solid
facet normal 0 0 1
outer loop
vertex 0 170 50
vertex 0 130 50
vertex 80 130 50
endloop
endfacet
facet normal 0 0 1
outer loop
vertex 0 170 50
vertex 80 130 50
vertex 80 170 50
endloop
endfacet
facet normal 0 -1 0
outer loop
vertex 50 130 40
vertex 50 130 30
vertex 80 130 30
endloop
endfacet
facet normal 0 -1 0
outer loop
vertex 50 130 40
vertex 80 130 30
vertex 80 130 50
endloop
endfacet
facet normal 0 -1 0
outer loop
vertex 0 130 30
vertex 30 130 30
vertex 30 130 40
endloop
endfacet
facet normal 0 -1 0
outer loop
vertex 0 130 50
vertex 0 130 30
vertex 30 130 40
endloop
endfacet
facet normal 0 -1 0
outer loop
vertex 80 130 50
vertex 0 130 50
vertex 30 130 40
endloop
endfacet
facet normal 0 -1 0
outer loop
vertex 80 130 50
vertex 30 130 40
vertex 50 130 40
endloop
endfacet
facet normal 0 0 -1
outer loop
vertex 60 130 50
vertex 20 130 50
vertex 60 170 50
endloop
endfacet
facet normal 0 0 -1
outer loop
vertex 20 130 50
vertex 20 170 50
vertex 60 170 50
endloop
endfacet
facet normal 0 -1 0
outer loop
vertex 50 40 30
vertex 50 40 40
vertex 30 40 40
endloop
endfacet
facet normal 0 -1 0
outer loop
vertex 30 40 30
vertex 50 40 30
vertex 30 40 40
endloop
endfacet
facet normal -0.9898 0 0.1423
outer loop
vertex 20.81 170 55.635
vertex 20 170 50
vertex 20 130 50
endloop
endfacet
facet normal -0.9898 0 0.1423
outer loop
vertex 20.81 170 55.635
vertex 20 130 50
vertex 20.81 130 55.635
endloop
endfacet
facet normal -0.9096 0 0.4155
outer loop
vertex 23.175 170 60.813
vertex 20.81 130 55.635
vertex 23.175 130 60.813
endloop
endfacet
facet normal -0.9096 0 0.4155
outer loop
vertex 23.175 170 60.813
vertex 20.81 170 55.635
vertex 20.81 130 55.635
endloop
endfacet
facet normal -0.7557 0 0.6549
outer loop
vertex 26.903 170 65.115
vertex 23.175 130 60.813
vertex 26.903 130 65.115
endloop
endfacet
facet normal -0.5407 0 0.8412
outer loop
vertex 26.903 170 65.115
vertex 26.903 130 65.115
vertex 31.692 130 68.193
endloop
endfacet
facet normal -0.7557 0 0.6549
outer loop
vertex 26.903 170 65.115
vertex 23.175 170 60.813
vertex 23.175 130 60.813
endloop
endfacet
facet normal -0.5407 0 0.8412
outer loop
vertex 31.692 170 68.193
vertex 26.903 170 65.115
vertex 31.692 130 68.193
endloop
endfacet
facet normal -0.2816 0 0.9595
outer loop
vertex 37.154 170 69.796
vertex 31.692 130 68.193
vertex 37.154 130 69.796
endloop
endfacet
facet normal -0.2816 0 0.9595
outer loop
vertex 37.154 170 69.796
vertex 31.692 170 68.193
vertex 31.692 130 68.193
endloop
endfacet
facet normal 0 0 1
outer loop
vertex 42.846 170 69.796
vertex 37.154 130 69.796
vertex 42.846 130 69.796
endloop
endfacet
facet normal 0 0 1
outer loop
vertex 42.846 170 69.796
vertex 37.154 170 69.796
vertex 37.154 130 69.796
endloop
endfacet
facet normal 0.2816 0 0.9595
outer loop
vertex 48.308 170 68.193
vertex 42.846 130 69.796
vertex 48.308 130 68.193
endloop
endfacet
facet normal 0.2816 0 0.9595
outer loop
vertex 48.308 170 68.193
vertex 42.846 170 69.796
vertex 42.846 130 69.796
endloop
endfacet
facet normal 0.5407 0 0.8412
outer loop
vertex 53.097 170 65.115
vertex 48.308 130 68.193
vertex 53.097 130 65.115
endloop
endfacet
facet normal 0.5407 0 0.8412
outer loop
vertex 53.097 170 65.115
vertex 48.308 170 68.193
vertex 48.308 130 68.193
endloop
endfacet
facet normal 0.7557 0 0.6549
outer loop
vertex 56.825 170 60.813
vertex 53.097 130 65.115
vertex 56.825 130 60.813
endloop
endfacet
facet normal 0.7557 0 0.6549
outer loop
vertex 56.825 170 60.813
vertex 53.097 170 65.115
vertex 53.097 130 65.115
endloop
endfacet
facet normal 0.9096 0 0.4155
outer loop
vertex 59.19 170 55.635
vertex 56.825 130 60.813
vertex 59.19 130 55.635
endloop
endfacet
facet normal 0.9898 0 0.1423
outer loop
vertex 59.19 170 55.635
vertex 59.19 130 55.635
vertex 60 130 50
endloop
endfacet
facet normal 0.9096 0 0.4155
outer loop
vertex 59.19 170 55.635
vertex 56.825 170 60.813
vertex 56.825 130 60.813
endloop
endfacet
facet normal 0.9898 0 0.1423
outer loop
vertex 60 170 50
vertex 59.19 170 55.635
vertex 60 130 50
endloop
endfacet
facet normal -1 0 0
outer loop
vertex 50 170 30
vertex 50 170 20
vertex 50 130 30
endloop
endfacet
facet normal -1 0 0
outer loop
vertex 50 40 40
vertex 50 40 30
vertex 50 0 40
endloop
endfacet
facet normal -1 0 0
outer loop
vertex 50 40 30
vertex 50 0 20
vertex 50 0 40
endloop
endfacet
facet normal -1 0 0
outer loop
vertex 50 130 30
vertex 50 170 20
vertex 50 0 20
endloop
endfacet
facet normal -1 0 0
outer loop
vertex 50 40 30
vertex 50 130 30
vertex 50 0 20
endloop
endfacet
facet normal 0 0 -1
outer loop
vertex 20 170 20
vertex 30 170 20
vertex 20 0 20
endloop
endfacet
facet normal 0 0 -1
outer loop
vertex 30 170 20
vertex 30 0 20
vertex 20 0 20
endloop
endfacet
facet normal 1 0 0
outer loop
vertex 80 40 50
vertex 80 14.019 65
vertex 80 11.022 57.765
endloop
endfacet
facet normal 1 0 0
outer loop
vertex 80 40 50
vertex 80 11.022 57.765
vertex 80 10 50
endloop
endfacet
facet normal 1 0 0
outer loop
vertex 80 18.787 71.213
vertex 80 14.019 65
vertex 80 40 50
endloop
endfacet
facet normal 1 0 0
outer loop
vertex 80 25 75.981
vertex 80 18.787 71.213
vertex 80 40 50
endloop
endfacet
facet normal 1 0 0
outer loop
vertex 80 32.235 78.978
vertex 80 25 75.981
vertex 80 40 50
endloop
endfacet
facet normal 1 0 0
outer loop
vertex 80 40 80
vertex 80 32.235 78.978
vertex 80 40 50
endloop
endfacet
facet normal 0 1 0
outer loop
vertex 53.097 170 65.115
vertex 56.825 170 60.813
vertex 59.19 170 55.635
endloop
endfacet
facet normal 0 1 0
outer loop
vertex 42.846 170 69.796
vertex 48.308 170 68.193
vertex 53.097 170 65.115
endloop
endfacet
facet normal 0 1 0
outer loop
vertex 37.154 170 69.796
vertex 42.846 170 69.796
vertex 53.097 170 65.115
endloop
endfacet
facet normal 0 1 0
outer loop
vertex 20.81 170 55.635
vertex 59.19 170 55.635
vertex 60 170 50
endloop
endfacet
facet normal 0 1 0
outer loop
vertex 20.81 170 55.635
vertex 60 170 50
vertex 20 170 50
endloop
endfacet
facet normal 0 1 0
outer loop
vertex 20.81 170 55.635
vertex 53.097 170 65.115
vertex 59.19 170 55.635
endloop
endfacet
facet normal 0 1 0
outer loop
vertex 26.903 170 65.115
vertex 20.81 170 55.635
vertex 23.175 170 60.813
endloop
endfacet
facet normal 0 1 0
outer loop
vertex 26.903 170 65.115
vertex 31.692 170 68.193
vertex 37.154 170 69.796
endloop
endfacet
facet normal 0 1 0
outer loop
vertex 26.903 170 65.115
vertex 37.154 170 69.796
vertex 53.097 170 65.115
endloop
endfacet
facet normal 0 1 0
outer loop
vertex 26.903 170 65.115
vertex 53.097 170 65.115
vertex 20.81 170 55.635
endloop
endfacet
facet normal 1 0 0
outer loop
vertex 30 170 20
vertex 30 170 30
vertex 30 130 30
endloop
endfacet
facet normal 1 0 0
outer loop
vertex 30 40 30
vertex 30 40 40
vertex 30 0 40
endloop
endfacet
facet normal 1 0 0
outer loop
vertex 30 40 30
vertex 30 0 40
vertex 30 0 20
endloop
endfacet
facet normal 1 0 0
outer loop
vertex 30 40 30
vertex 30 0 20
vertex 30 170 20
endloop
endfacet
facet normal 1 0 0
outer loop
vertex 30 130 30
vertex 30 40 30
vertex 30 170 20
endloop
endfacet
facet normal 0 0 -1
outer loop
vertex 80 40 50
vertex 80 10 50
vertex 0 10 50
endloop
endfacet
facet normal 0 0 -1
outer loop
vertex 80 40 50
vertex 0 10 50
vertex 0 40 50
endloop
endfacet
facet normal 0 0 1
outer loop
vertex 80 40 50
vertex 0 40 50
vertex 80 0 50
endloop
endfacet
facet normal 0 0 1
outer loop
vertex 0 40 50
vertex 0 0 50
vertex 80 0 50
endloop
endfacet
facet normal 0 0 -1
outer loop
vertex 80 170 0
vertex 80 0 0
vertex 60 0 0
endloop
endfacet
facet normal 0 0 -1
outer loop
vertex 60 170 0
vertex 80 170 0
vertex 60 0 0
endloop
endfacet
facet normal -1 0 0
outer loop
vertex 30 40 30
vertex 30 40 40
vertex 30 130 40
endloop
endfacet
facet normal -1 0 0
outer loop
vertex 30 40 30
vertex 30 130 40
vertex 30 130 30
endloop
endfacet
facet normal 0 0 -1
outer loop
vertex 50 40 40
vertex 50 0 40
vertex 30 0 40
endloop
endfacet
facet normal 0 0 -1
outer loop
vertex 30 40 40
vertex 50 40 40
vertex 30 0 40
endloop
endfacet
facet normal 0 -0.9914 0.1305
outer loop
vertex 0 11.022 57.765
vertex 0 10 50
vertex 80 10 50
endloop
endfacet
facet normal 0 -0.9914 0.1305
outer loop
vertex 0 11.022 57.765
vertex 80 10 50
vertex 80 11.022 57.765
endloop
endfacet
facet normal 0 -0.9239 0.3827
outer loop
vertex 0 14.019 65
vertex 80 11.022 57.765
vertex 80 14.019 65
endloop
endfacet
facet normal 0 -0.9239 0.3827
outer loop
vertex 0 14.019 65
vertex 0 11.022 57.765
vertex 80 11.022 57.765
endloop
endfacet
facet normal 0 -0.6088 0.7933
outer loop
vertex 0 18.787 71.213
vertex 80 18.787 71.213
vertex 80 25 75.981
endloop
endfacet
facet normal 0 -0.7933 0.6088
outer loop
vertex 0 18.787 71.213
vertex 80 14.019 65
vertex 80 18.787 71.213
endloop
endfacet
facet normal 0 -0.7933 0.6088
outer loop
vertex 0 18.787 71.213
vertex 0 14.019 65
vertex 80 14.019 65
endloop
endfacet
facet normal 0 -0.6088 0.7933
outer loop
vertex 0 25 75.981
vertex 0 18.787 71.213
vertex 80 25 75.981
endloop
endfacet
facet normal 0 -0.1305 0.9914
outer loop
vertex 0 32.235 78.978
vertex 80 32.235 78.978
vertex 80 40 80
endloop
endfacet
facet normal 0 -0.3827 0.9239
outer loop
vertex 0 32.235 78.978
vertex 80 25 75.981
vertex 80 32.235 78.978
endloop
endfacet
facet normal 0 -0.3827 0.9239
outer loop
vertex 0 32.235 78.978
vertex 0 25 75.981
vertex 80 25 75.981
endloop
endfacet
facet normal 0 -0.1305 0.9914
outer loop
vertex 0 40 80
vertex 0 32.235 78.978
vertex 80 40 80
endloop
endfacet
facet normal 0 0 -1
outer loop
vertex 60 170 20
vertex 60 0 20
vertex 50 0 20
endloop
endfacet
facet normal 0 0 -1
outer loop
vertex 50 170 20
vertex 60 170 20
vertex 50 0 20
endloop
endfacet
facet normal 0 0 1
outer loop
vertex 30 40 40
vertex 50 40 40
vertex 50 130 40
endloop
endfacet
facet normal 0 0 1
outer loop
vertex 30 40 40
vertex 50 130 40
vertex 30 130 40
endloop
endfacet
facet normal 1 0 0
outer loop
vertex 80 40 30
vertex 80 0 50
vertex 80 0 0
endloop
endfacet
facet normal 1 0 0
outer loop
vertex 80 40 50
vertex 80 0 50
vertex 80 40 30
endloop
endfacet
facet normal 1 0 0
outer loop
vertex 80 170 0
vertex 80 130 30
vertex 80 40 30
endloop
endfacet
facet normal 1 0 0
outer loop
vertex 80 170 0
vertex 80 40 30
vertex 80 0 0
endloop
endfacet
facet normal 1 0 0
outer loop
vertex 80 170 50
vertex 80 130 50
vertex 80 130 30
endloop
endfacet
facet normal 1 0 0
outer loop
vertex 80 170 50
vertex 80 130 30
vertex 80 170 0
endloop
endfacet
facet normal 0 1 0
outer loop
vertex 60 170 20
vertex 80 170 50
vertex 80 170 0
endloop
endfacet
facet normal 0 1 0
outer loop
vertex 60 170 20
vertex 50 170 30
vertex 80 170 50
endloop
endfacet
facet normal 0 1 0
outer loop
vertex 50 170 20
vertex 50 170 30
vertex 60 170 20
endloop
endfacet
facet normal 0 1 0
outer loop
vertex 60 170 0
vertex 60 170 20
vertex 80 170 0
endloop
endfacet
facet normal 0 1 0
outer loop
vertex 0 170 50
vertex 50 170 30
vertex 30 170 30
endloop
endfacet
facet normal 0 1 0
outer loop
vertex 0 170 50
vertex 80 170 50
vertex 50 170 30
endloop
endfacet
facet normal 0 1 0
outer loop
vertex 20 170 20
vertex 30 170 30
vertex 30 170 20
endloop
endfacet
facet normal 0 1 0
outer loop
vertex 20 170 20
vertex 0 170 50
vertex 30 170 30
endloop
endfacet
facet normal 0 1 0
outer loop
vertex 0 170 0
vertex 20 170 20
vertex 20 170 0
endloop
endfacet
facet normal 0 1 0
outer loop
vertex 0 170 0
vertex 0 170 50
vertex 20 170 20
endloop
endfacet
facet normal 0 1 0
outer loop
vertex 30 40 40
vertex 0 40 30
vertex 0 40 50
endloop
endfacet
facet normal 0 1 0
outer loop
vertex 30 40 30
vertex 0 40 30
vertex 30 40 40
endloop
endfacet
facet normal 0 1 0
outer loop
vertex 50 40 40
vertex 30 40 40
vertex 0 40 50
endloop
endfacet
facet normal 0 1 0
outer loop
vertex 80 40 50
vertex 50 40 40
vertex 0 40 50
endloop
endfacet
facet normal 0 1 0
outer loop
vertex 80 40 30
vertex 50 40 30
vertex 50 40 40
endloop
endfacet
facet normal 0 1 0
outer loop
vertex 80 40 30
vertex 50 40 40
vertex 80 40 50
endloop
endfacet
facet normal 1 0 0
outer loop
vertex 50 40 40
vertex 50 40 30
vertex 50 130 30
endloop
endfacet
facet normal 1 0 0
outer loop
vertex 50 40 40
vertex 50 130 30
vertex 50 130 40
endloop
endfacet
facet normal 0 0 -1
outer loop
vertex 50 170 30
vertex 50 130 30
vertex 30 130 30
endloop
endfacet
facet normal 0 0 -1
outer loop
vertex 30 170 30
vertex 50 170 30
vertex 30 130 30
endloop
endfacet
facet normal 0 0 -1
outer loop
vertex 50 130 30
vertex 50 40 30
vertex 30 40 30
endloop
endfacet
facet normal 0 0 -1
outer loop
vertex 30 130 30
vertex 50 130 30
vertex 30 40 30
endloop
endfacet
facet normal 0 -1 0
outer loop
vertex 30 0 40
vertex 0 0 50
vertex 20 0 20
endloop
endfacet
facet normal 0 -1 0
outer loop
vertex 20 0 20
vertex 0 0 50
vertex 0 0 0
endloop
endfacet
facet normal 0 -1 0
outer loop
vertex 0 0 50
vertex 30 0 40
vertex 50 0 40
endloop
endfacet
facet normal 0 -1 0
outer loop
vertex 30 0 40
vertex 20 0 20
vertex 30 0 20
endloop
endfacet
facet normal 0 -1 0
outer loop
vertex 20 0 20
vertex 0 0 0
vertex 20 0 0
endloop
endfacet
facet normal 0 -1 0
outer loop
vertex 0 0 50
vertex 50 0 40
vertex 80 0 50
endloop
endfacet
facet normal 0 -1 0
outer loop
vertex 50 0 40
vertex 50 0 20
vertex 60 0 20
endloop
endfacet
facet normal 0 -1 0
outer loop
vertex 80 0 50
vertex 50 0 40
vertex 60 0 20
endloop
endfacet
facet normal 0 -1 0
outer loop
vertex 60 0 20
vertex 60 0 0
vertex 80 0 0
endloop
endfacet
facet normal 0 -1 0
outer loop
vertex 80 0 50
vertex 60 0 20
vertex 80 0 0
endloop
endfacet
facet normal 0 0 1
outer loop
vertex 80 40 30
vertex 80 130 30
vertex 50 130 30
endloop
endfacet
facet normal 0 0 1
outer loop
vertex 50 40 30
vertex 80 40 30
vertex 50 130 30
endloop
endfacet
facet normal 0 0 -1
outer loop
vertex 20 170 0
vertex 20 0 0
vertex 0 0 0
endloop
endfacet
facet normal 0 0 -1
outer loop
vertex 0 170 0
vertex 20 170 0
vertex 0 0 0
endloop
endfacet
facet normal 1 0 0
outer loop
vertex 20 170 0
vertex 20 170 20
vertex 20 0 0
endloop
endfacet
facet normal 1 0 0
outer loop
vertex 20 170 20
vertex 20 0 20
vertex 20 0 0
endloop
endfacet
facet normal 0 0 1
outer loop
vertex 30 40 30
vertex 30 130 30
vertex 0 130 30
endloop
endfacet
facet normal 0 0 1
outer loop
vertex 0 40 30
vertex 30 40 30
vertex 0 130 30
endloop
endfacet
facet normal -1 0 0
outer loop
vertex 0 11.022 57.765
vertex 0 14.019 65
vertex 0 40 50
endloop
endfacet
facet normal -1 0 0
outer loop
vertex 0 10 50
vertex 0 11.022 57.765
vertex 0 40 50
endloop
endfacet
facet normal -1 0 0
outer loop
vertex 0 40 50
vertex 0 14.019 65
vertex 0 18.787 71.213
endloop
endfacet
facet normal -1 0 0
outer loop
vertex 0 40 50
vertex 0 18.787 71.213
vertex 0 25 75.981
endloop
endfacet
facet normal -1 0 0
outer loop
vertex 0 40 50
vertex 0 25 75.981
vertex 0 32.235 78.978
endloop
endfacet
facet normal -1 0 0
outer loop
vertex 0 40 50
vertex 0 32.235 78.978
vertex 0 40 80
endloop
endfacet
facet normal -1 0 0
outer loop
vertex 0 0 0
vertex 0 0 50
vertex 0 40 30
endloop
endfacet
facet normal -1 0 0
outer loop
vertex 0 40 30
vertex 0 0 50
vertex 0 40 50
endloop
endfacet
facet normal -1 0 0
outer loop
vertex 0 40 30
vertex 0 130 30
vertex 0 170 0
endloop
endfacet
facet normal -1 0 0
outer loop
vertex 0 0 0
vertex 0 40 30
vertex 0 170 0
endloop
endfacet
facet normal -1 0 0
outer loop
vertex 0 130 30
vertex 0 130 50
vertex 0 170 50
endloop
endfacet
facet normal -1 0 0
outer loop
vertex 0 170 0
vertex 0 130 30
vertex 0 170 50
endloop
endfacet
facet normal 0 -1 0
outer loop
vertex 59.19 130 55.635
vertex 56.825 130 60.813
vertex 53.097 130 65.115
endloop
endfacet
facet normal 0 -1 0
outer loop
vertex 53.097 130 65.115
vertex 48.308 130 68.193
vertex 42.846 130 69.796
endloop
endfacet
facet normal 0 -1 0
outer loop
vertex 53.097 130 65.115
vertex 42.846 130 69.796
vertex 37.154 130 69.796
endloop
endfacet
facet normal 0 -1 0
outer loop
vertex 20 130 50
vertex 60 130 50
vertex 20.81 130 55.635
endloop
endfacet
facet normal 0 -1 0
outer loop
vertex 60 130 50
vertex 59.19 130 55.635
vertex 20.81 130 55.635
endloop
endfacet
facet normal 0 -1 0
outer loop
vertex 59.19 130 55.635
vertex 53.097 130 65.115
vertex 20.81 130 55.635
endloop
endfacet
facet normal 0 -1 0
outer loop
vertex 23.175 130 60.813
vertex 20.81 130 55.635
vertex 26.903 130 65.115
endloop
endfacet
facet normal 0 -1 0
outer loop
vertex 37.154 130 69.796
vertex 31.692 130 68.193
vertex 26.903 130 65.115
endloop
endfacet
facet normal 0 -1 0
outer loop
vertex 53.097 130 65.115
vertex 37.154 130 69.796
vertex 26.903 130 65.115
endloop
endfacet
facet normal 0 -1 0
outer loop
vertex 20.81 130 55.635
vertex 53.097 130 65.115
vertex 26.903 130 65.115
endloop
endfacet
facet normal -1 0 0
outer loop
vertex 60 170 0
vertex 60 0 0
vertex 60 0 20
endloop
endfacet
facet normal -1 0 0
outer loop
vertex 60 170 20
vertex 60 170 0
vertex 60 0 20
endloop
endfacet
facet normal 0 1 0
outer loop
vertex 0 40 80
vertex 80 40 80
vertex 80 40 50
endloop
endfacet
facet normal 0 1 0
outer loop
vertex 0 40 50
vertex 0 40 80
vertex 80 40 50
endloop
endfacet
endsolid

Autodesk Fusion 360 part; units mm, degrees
sketch "Sketch1" plane through (0, 0, 0) normal (0, 1, 0) x (1, 0, 0)
  line L0 (0, 0) -> (0, -50)
  line L1 (0, -50) -> (80, -50)
  line L2 (80, -50) -> (80, 0)
  line L3 (80, 0) -> (60, 0)
  line L4 (60, 0) -> (60, -20)
  line L5 (60, -20) -> (50, -20)
  line L6 (50, -20) -> (50, -40)
  line L7 (50, -40) -> (30, -40)
  line L8 (30, -40) -> (30, -20)
  line L9 (30, -20) -> (20, -20)
  line L10 (20, -20) -> (20, 0)
  line L11 (20, 0) -> (0, 0)
  dimension "d1" = 50
sketch "Sketch2" plane through (0, 0, 0) normal (0, 0, 1) x (1, 0, 0)
  line L0 (0, 0) -> (0, 170)
  line L1 (0, 170) -> (20, 170)
  line L2 (20, 170) -> (20, 0)
  line L3 (80, 0) -> (80, 170)
  line L4 (80, 170) -> (60, 170)
  line L5 (60, 170) -> (60, 0)
  dimension "d3" = 170
sketch "Sketch3" plane through (0, 0, 0) normal (1, 0, 0) x (0, 1, 0)
  line L0 (0, 50) -> (10, 50)
  arc A0 (40, 80) -> (10, 50) centre (40, 50) ccw
  line L1 (40, 80) -> (40, 30)
  line L2 (40, 30) -> (130, 30)
  line L3 (130, 30) -> (130, 50)
  line L4 (130, 50) -> (170, 50)
  line L5 (170, 50) -> (170, 0)
  line L6 (130, 30) -> (170, 30)
  line L7 (10, 50) -> (40, 50)
extrude "Extrude1" add sketch "Sketch1" along normal blind 40 makes body 1
sketch "Sketch5" plane through (0, 40, 0) normal (0, 1, 0) x (-1, 0, 0)
  line L0 (-20, 0) -> (0, 0)
  line L1 (0, 0) -> (0, 50)
  line L2 (0, 50) -> (-80, 50)
  line L3 (-80, 50) -> (-80, 0)
  line L4 (-80, 0) -> (-60, 0)
  line L5 (-60, 0) -> (-60, 20)
  line L6 (-60, 20) -> (-50, 20)
  line L7 (-50, 20) -> (-50, 40)
  line L8 (-50, 40) -> (-30, 40)
  line L9 (-30, 40) -> (-30, 20)
  line L10 (-30, 20) -> (-20, 20)
  line L11 (-20, 20) -> (-20, 0)
  line L12 (-80, 0) -> (-80, 30)
  line L13 (-80, 30) -> (-50, 30)
  line L14 (-50, 20) -> (-60, 20)
  line L15 (-60, 0) -> (-80, 0)
  line L16 (-20, 0) -> (-20, 20)
  line L17 (-30, 20) -> (-30, 30)
  line L18 (0, 30) -> (0, 0)
  line L19 (-30, 30) -> (0, 30)
  line L20 (0, 0) -> (-20, 0)
  line L21 (-50, 30) -> (-50, 40)
  line L22 (-30, 40) -> (-30, 30)
  line L23 (-50, 30) -> (-30, 30)
extrude "Extrude2" add sketch "Sketch5" along normal blind 130 contours L3 L4 L5 L6 L7 L12 L13 L14 L15 bodies 1
extrude "Extrude3" add sketch "Sketch5" along normal blind 130 contours L0 L1 L9 L10 L11 L16 L17 L18 L19 L20 bodies 1
extrude "Extrude4" add sketch "Sketch5" along normal blind 90 separate body contours L7 L8 L9 L21 L22 L23 makes body 2
extrude "Extrude5" add sketch "Sketch3" along normal blind 80 contours L3 L4 L5 L6 bodies 1 2
extrude "Extrude6" add sketch "Sketch3" along normal blind 80 separate body contours A0 L1 L7 makes body 3
sketch "Sketch6" plane through (0, 170, 0) normal (0, 1, 0) x (-1, 0, 0)
  line L0 (-30, 20) -> (-20, 20)
  line L1 (-20, 20) -> (-20, 0)
  line L2 (-20, 0) -> (0, 0)
  line L3 (0, 0) -> (0, 50)
  line L4 (0, 50) -> (-80, 50)
  line L5 (-80, 50) -> (-80, 0)
  line L6 (-80, 0) -> (-60, 0)
  line L7 (-60, 0) -> (-60, 20)
  line L8 (-60, 20) -> (-50, 20)
  line L9 (-50, 20) -> (-50, 30)
  line L10 (-50, 30) -> (-30, 30)
  line L11 (-30, 30) -> (-30, 20)
  arc A0 (-20, 50) -> (-60, 50) centre (-40, 50) ccw
  line L12 (-60, 50) -> (-20, 50)
extrude "Extrude7" add sketch "Sketch6" against normal blind 40 separate body contours L4 A0 L12 makes body 4
